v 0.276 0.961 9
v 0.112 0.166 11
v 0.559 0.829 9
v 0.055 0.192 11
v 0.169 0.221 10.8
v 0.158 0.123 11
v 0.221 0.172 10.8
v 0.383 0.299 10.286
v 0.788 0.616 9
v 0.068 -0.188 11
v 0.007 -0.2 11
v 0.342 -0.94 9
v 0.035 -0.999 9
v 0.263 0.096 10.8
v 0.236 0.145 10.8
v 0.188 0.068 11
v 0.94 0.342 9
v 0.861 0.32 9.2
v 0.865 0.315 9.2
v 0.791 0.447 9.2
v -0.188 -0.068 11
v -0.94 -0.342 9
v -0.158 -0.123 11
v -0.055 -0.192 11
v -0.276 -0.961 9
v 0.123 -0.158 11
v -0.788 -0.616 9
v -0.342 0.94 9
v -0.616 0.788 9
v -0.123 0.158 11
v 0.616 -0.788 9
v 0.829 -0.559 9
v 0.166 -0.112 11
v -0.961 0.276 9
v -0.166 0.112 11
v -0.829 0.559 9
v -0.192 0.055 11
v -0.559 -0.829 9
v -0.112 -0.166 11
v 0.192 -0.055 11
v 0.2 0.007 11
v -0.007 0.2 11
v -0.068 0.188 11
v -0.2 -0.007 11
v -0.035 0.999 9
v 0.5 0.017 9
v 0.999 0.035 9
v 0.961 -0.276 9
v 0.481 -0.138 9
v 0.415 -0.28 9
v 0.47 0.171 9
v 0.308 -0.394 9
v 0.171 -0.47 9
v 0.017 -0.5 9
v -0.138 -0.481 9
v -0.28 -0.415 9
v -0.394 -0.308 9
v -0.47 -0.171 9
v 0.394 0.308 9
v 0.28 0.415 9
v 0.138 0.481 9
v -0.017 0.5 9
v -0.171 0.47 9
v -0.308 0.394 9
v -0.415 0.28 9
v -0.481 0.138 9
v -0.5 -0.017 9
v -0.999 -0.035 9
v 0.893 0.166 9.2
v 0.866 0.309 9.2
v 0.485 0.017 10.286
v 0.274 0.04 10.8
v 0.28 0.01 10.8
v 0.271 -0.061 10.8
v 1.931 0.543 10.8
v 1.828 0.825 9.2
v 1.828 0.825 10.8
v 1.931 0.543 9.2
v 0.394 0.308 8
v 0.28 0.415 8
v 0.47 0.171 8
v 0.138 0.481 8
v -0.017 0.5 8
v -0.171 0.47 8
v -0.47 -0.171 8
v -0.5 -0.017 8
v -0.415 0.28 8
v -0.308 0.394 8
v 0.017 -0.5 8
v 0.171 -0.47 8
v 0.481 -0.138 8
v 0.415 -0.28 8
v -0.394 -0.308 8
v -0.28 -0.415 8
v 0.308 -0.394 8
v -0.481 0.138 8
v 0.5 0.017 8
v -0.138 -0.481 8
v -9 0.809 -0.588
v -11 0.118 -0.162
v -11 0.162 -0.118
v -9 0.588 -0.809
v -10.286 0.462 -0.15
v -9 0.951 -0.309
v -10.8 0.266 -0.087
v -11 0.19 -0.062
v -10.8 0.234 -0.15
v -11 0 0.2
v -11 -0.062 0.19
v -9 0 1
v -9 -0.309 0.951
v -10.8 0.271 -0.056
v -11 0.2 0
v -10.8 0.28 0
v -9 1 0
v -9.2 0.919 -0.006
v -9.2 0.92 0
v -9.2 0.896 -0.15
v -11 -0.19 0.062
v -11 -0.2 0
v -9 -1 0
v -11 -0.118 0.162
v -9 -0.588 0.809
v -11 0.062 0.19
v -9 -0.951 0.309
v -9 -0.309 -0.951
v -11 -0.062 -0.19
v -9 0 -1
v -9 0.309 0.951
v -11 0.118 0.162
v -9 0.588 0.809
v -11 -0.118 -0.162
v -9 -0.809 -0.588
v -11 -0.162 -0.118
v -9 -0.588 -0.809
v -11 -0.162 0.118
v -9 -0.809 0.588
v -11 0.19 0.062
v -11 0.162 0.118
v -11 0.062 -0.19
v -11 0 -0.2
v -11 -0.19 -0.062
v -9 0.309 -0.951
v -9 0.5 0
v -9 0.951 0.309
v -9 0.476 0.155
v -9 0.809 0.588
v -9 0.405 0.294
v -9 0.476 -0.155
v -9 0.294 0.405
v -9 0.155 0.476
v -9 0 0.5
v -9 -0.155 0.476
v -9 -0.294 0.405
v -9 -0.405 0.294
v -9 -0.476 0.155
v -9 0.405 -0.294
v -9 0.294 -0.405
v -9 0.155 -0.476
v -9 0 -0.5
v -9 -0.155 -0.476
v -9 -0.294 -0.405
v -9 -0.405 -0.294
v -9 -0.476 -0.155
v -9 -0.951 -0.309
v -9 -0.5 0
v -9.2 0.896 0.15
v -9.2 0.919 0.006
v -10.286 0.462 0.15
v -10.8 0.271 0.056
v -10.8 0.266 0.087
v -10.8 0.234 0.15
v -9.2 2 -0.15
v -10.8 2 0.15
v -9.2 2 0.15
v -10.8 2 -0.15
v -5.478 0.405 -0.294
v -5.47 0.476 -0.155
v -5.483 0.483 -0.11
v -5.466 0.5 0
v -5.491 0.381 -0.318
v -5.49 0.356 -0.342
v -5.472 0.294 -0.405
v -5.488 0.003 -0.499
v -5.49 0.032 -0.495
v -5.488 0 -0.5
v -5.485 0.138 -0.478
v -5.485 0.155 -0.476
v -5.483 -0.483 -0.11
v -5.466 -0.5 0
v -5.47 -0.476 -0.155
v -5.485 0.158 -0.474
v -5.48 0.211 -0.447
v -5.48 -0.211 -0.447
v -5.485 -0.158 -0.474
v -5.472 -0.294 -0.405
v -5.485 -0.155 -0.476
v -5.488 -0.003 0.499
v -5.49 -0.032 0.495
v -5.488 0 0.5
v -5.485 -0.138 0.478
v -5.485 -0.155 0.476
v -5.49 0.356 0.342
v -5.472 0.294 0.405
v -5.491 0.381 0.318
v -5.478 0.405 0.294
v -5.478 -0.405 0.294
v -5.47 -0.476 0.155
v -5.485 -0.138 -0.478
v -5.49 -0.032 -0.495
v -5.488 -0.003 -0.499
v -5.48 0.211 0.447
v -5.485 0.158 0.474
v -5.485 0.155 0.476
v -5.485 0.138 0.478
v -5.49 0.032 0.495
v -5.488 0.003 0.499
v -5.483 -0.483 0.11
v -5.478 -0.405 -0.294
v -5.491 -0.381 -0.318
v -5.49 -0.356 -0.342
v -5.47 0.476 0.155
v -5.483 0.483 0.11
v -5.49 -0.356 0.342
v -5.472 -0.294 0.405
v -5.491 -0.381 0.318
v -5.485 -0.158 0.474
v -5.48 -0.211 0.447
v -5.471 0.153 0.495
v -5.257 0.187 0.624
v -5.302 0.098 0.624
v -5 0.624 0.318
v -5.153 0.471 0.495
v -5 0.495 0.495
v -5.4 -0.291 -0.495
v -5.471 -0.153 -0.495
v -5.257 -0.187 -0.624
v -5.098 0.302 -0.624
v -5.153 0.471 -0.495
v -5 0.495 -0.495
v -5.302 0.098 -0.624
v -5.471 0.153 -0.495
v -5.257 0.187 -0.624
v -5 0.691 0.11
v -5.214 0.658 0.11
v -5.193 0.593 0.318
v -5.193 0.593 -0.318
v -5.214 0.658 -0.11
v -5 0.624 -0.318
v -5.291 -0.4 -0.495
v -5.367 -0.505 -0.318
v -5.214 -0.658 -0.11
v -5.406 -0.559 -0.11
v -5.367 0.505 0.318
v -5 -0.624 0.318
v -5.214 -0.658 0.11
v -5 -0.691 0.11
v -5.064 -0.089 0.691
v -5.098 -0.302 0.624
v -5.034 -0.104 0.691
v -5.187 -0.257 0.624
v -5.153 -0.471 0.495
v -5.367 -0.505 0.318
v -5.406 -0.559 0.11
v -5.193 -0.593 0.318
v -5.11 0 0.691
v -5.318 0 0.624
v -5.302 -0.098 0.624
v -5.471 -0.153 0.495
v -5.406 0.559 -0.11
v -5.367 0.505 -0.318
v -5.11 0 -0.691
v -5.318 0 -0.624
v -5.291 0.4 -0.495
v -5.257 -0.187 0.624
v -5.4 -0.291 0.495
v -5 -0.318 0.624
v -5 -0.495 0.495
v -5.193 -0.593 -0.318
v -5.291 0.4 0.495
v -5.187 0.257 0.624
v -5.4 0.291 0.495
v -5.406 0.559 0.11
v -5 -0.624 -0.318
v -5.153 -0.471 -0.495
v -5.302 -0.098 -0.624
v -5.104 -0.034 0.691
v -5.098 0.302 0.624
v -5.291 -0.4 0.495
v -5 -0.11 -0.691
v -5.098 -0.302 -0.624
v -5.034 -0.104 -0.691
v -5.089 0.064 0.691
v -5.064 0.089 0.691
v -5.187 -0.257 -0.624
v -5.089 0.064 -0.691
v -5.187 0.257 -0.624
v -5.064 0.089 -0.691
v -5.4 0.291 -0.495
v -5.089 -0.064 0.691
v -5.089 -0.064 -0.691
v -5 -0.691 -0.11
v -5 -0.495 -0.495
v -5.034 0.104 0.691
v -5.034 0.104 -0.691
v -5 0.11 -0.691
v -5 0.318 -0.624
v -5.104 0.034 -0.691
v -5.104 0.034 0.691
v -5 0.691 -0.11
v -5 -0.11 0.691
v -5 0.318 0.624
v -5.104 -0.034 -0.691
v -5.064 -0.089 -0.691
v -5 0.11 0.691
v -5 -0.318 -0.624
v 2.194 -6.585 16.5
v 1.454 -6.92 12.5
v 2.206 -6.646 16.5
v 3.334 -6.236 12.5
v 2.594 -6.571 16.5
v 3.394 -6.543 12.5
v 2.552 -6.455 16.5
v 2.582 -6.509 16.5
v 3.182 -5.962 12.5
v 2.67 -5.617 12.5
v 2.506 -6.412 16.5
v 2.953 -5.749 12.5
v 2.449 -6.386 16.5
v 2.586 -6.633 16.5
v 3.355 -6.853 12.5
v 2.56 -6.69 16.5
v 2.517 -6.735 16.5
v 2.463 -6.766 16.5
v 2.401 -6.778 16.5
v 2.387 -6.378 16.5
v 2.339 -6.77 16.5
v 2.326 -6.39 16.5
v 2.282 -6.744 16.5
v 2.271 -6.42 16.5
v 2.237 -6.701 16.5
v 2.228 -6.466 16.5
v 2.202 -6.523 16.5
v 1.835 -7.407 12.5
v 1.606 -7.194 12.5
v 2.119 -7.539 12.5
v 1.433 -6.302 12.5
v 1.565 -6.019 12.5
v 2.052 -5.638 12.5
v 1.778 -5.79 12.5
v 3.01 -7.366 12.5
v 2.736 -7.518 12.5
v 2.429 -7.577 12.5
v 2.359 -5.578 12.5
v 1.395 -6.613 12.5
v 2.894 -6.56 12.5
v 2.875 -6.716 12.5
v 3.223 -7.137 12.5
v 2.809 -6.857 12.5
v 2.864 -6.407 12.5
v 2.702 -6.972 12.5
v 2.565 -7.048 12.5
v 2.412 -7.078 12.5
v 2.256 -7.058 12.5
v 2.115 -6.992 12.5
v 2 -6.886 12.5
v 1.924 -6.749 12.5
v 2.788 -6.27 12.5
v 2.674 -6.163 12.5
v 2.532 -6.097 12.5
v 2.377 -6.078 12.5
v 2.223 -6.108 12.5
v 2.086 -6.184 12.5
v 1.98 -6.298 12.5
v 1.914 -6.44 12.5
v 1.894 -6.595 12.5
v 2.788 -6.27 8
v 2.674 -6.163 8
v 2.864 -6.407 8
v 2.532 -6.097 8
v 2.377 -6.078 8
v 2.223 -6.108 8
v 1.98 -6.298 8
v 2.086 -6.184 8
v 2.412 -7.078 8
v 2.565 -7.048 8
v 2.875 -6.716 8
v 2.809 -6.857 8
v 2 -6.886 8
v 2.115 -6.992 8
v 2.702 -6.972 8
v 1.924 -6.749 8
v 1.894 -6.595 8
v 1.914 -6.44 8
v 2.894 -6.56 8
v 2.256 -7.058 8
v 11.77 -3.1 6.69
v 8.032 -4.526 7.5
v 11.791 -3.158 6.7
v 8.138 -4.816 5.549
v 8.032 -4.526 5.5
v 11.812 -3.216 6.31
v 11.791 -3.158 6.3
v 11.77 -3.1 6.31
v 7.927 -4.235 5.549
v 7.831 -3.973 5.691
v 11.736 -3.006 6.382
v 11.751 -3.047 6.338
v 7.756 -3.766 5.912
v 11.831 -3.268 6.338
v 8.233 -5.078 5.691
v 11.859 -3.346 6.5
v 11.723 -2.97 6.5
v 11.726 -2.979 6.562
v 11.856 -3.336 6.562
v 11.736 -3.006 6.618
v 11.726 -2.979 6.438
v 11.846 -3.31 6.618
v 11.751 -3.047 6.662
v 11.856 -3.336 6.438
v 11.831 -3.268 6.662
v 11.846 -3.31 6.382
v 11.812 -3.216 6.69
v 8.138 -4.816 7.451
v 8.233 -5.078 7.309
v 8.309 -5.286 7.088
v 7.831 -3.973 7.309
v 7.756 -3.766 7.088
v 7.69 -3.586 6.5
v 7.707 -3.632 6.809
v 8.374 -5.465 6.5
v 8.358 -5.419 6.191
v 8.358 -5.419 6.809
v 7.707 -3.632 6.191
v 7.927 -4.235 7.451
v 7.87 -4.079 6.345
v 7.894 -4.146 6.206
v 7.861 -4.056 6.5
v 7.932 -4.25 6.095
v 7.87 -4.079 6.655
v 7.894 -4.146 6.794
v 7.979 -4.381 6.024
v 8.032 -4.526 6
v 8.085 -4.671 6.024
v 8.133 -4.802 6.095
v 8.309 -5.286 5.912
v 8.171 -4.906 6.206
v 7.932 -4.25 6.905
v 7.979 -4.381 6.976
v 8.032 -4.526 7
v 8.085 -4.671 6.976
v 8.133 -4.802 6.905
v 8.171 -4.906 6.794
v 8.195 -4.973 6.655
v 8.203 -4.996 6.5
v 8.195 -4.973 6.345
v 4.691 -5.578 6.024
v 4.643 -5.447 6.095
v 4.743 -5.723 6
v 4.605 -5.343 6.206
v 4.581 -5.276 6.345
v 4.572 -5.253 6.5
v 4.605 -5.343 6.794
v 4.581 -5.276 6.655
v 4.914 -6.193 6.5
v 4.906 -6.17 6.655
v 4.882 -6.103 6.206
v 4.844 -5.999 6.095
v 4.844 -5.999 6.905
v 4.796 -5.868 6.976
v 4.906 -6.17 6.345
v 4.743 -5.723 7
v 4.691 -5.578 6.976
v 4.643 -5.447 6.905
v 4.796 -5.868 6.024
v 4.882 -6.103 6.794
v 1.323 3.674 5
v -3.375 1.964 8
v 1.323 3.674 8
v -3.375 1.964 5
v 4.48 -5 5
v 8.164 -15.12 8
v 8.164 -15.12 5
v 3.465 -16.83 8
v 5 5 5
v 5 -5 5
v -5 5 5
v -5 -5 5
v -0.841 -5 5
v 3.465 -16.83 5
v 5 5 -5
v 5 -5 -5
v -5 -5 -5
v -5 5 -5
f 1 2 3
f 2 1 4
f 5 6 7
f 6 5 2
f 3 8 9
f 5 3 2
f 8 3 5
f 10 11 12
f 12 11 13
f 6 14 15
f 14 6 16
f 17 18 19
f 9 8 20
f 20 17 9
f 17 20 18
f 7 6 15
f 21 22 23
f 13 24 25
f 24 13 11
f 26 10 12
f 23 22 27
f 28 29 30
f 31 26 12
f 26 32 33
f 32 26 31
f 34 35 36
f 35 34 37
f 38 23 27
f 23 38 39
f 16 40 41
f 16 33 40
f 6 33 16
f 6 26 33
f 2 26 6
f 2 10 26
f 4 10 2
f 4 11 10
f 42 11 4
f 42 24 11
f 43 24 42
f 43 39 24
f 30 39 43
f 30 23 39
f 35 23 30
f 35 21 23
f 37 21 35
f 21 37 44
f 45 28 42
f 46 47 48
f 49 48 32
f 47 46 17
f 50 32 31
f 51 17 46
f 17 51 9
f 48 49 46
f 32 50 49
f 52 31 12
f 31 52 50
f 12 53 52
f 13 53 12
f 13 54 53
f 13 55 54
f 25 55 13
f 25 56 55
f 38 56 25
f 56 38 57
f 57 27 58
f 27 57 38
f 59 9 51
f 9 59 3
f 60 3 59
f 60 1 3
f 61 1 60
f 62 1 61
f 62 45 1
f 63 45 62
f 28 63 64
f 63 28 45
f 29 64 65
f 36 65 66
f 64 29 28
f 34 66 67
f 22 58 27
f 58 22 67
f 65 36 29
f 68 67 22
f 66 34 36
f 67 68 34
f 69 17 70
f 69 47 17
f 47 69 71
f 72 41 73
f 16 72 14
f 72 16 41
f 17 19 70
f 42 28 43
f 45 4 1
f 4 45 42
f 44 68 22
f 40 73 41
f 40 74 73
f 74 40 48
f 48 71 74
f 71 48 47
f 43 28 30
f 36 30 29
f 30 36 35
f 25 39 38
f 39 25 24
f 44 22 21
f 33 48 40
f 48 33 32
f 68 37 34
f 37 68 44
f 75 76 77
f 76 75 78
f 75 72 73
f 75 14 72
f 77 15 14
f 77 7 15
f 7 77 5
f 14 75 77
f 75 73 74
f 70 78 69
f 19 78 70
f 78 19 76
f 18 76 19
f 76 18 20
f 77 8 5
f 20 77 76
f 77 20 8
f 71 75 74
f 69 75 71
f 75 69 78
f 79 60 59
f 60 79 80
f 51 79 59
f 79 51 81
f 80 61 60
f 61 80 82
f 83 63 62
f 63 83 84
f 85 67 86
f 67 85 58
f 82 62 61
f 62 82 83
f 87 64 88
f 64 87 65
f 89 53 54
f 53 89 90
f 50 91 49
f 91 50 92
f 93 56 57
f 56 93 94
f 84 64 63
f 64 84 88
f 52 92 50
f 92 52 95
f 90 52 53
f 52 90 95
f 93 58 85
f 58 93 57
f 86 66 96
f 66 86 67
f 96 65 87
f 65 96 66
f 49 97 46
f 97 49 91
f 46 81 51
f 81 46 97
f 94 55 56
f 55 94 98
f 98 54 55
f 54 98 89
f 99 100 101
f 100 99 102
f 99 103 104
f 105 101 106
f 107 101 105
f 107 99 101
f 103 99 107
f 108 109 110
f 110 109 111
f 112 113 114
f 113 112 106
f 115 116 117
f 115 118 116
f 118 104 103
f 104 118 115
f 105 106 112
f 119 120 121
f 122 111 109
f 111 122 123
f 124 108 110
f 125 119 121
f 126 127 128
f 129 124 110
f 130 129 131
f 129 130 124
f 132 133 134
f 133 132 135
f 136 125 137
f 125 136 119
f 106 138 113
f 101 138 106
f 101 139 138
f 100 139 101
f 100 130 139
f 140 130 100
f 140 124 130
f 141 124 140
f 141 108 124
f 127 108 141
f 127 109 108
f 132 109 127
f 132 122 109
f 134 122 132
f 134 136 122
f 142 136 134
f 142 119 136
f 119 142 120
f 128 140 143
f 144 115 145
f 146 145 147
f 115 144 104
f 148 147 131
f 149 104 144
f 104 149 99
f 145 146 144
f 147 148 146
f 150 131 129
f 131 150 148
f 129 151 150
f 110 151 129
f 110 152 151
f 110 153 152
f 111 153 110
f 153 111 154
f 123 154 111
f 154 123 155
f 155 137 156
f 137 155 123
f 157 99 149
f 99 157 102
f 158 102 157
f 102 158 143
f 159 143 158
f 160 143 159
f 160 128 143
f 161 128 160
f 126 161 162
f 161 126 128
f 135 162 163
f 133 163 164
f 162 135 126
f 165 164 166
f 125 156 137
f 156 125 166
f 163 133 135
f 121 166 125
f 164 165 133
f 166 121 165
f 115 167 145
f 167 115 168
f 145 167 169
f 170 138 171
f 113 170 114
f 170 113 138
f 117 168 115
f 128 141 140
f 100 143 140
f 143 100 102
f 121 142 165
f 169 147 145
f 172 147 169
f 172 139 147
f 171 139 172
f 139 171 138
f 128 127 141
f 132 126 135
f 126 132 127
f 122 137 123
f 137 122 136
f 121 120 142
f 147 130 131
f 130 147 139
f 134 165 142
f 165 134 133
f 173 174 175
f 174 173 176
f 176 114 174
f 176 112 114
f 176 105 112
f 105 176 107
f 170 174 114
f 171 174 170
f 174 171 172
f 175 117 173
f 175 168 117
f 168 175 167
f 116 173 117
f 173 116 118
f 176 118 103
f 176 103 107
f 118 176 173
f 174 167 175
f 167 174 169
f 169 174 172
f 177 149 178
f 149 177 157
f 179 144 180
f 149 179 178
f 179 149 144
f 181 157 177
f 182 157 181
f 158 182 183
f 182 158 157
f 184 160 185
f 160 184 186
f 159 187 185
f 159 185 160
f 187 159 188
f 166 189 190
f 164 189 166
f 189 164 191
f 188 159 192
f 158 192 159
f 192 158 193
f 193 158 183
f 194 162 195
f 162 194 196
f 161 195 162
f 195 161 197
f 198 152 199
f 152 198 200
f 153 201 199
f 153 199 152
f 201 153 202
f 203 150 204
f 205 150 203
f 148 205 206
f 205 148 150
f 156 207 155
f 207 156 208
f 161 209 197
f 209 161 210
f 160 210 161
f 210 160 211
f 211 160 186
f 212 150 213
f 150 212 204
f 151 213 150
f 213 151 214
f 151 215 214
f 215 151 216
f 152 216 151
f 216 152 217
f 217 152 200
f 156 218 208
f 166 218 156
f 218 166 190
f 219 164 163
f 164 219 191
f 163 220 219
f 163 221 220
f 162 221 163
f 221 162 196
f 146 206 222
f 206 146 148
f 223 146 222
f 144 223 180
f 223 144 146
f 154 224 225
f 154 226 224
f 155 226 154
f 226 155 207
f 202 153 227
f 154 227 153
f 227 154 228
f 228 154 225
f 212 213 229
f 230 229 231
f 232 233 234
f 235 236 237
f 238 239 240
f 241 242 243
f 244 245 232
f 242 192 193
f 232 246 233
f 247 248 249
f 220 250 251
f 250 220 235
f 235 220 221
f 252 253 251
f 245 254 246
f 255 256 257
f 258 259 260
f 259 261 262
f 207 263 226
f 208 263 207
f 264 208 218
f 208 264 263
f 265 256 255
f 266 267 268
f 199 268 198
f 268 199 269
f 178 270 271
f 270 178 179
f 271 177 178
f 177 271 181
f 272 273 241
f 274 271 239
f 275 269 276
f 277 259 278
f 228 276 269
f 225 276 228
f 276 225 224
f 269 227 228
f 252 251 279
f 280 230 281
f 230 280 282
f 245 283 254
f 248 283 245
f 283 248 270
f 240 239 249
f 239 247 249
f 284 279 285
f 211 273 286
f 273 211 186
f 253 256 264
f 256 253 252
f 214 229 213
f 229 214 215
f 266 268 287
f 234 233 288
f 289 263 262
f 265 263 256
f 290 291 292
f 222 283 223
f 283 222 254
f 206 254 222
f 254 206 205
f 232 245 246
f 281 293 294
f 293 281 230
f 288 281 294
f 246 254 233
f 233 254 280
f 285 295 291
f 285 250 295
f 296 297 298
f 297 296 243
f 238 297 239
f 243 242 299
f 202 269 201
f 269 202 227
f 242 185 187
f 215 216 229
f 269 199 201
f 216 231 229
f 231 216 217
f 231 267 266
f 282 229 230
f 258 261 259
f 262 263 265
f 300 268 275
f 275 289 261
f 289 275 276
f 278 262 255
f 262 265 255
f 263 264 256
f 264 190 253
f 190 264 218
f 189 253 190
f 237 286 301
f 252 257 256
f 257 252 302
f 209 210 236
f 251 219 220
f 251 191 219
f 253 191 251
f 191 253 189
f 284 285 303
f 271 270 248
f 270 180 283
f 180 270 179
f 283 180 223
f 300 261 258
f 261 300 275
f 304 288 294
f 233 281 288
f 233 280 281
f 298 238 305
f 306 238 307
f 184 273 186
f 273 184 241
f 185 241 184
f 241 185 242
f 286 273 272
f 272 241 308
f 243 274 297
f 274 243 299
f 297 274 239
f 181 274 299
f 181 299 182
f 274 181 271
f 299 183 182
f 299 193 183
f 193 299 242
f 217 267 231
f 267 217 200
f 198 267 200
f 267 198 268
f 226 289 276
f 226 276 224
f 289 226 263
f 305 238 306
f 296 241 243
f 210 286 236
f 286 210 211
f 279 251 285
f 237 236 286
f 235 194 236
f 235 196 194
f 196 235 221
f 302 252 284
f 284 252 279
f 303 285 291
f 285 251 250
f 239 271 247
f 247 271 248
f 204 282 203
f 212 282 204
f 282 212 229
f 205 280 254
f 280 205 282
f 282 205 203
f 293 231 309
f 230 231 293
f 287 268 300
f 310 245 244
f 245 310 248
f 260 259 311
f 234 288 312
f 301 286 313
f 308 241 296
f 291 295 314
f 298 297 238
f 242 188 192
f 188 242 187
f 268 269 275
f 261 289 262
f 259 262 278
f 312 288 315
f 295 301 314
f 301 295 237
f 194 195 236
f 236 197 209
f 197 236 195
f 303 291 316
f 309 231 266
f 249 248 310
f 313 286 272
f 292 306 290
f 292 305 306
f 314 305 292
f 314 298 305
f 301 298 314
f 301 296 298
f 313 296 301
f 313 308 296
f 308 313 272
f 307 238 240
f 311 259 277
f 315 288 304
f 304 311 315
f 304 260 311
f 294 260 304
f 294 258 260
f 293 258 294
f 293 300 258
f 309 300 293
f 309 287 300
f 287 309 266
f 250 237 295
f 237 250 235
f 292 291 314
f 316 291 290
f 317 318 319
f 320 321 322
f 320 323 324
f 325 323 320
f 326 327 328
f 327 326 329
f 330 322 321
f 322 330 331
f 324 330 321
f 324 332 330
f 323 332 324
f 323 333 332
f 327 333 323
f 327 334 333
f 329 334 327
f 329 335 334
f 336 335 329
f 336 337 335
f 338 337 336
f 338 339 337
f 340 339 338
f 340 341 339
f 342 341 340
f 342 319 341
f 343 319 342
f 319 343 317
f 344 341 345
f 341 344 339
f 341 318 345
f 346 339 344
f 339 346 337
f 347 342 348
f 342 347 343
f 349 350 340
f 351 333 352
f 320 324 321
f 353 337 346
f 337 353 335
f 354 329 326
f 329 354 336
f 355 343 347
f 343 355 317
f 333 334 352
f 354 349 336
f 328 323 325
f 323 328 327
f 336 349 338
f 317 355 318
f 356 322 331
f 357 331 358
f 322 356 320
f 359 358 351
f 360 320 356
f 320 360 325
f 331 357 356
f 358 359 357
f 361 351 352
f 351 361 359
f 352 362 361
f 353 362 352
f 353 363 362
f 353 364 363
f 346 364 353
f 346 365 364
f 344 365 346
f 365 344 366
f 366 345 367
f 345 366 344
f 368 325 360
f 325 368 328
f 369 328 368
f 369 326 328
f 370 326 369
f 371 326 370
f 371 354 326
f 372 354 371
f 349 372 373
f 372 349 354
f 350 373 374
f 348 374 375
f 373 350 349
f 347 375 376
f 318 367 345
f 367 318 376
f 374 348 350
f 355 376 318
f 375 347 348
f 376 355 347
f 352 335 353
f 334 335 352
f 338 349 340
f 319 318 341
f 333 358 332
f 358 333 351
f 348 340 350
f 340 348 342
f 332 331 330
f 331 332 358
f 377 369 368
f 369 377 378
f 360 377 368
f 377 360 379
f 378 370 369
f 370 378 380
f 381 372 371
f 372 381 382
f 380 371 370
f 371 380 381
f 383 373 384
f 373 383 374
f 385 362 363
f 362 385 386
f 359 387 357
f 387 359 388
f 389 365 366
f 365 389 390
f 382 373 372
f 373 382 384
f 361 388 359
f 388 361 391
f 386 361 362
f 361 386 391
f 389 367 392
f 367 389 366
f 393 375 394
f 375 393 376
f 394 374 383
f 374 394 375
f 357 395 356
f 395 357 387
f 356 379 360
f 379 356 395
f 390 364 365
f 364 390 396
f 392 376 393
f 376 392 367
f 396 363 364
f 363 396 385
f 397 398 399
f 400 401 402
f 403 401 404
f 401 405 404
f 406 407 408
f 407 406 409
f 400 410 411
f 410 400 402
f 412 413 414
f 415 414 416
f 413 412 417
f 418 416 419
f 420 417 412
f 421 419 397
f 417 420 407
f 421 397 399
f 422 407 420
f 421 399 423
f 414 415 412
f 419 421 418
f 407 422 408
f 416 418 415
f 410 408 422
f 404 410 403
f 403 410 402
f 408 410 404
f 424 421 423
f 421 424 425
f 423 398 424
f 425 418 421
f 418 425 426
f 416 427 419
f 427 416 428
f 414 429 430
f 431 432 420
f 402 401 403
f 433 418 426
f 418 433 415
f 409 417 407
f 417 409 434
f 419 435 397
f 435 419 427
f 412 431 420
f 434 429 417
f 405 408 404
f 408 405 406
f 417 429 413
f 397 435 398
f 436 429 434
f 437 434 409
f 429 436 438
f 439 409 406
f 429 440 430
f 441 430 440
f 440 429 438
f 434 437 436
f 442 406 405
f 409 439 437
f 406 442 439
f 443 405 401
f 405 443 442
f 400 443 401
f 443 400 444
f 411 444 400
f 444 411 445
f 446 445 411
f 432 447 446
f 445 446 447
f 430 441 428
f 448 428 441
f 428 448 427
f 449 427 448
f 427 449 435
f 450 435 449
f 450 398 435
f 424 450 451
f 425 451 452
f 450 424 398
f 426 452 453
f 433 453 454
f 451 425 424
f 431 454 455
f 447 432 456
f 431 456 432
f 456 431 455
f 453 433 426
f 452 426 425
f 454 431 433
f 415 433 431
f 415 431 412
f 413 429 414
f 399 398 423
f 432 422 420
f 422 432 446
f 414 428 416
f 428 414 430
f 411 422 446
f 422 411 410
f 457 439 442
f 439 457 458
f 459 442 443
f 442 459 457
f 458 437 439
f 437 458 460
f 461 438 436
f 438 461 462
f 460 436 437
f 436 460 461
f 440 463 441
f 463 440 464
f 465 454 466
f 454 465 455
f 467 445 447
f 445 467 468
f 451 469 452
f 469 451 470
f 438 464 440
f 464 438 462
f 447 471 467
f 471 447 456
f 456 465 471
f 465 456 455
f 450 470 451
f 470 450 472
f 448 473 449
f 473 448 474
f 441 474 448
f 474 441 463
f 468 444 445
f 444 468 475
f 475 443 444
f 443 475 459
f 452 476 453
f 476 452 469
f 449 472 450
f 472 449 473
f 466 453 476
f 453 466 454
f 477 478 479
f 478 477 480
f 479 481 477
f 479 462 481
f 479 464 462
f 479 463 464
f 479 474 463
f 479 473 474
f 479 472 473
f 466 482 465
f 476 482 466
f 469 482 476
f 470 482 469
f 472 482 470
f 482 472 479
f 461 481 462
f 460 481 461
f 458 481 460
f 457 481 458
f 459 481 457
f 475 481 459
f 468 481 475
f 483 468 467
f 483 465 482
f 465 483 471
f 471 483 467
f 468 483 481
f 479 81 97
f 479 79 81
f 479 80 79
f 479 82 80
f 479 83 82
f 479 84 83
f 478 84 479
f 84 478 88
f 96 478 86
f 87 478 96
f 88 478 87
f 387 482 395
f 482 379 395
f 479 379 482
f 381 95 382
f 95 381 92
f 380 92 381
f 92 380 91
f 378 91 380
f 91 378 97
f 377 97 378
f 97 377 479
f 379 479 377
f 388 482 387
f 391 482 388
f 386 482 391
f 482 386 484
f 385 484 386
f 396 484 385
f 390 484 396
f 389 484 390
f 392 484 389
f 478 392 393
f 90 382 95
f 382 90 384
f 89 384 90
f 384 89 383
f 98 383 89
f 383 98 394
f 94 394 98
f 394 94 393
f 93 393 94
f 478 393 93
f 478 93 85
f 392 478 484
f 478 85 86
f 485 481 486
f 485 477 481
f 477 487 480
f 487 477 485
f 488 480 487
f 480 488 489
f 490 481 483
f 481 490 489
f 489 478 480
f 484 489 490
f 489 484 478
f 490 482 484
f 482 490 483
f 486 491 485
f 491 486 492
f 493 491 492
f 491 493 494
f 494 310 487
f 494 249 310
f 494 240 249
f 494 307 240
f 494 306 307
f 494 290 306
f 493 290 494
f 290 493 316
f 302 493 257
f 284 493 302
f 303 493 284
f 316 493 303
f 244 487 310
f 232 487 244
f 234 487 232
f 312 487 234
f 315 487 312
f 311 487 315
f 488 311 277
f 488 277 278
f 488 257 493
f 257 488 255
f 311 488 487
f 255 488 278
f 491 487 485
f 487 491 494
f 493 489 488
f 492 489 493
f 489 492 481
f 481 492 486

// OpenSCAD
//---------------------------------------------------------------
//-- Openscad Attachment library
//-- Attach parts easily. Make your designs more reusable and clean
//---------------------------------------------------------------
//-- This is a component of the obiscad opescad tools by Obijuan
//-- (C) Juan Gonzalez-Gomez (Obijuan)
//-- Sep-2012
//---------------------------------------------------------------
//-- Released under the GPL license
//---------------------------------------------------------------

use <vector.scad>

//--------------------------------------------------------------------
//-- Draw a connector
//-- A connector is defined a 3-tuple that consist of a point
//--- (the attachment point), and axis (the attachment axis) and
//--- an angle the connected part should be rotate around the 
//--  attachment axis
//--
//--- Input parameters:
//--
//--  Connector c = [p , n, ang] where:
//--
//--     p : The attachment point
//--     v : The attachment axis
//--   ang : the angle
//--------------------------------------------------------------------
module connector(c)
{
  //-- Get the three components from the connector
  p = c[0];
  v = c[1];
  ang = c[2];

  //-- Draw the attachment poing
  color("Gray") point(p);

  //-- Draw the attachment axis vector (with a mark)
  translate(p)
    rotate(a=ang, v=v)
    color("Gray") vector(unitv(v)*6, l_arrow=2, mark=true);
}


//-------------------------------------------------------------------------
//--  ATTACH OPERATOR
//--  This operator applies the necesary transformations to the 
//--  child (attachable part) so that it is attached to the main part
//--  
//--  Parameters
//--    a -> Connector of the main part
//--    b -> Connector of the attachable part
//-------------------------------------------------------------------------
module attach(a,b)
{
  //-- Get the data from the connectors
  pos1 = a[0];  //-- Attachment point. Main part
  v    = a[1];  //-- Attachment axis. Main part
  roll = a[2];  //-- Rolling angle
  
  pos2 = b[0];  //-- Attachment point. Attachable part
  vref = b[1];  //-- Atachment axis. Attachable part
                //-- The rolling angle of the attachable part is not used

  //-------- Calculations for the "orientate operator"------
  //-- Calculate the rotation axis
  raxis = cross(vref,v);
    
  //-- Calculate the angle between the vectors
  ang = anglev(vref,v);
  //--------------------------------------------------------.-

  //-- Apply the transformations to the child ---------------------------

  //-- Place the attachable part on the main part attachment point
  translate(pos1)
    //-- Orientate operator. Apply the orientation so that
    //-- both attachment axis are paralell. Also apply the roll angle
    rotate(a=roll, v=v)  rotate(a=ang, v=raxis)
      //-- Attachable part to the origin
      translate(-pos2)
	child(0); 
}


//--------------------------------------------------------------------
//---   An example of the attach operator
//---  
//---  There are two parts: the main body and an arm
//---  They both are cubes (for simplicity)
//---
//--   In the main body there are 2 connectors defined, so that
//--  the arm can be attached to any of them (or both if you like)
//------------------------------------------------------------------

//-- In the debug mode the connectors and additional information
//-- are shown
debug=true;

//-- Define the Main part: A cube
//-- Two attachment points are defined: one on the top, another in the
//--- left side
size = [10,10,10];

//-- Connectors defined:

//--     Att. point       Att. Axis  Roll
c1 = [ [0,0,size[2]/2],  [0,0,1],     20];  //-- Connector on the top
c2 = [ [-size[0]/2,0,0], [-1,0,0],    90];  //-- Connector on the left


//-- Draw the main part along with the connectors (for debugging)
cube(size,center=true);

//-- In debug mode: Draw the main part connectors!
if (debug) {
  connector(c1);
  connector(c2);
}

//-- Define the Attachable part. It is another cube, with one connector
asize = [5,20,3];
a = [ [0,asize[1]/2-3,-asize[2]/2], [0,0,1], 0  ];


//-- Do the attach!
//-- Just change c1 by c2 to attach the part to the other 
//-- connector. Super-easy!! :-)
//-- Modify the c1 and c2 roll angle for rotating the attachable
//--  part to the desired orientation
attach(c1,a)
  //-- This is the attachable part! 
  union() {
    cube(asize,center=true);  //-- The part

    //-- In debug mode show additional info:
    if (debug) {
      frame(l=10);    //-- The part frame of reference.
      connector(a);   //-- Show the part connector
    }
  };

  
